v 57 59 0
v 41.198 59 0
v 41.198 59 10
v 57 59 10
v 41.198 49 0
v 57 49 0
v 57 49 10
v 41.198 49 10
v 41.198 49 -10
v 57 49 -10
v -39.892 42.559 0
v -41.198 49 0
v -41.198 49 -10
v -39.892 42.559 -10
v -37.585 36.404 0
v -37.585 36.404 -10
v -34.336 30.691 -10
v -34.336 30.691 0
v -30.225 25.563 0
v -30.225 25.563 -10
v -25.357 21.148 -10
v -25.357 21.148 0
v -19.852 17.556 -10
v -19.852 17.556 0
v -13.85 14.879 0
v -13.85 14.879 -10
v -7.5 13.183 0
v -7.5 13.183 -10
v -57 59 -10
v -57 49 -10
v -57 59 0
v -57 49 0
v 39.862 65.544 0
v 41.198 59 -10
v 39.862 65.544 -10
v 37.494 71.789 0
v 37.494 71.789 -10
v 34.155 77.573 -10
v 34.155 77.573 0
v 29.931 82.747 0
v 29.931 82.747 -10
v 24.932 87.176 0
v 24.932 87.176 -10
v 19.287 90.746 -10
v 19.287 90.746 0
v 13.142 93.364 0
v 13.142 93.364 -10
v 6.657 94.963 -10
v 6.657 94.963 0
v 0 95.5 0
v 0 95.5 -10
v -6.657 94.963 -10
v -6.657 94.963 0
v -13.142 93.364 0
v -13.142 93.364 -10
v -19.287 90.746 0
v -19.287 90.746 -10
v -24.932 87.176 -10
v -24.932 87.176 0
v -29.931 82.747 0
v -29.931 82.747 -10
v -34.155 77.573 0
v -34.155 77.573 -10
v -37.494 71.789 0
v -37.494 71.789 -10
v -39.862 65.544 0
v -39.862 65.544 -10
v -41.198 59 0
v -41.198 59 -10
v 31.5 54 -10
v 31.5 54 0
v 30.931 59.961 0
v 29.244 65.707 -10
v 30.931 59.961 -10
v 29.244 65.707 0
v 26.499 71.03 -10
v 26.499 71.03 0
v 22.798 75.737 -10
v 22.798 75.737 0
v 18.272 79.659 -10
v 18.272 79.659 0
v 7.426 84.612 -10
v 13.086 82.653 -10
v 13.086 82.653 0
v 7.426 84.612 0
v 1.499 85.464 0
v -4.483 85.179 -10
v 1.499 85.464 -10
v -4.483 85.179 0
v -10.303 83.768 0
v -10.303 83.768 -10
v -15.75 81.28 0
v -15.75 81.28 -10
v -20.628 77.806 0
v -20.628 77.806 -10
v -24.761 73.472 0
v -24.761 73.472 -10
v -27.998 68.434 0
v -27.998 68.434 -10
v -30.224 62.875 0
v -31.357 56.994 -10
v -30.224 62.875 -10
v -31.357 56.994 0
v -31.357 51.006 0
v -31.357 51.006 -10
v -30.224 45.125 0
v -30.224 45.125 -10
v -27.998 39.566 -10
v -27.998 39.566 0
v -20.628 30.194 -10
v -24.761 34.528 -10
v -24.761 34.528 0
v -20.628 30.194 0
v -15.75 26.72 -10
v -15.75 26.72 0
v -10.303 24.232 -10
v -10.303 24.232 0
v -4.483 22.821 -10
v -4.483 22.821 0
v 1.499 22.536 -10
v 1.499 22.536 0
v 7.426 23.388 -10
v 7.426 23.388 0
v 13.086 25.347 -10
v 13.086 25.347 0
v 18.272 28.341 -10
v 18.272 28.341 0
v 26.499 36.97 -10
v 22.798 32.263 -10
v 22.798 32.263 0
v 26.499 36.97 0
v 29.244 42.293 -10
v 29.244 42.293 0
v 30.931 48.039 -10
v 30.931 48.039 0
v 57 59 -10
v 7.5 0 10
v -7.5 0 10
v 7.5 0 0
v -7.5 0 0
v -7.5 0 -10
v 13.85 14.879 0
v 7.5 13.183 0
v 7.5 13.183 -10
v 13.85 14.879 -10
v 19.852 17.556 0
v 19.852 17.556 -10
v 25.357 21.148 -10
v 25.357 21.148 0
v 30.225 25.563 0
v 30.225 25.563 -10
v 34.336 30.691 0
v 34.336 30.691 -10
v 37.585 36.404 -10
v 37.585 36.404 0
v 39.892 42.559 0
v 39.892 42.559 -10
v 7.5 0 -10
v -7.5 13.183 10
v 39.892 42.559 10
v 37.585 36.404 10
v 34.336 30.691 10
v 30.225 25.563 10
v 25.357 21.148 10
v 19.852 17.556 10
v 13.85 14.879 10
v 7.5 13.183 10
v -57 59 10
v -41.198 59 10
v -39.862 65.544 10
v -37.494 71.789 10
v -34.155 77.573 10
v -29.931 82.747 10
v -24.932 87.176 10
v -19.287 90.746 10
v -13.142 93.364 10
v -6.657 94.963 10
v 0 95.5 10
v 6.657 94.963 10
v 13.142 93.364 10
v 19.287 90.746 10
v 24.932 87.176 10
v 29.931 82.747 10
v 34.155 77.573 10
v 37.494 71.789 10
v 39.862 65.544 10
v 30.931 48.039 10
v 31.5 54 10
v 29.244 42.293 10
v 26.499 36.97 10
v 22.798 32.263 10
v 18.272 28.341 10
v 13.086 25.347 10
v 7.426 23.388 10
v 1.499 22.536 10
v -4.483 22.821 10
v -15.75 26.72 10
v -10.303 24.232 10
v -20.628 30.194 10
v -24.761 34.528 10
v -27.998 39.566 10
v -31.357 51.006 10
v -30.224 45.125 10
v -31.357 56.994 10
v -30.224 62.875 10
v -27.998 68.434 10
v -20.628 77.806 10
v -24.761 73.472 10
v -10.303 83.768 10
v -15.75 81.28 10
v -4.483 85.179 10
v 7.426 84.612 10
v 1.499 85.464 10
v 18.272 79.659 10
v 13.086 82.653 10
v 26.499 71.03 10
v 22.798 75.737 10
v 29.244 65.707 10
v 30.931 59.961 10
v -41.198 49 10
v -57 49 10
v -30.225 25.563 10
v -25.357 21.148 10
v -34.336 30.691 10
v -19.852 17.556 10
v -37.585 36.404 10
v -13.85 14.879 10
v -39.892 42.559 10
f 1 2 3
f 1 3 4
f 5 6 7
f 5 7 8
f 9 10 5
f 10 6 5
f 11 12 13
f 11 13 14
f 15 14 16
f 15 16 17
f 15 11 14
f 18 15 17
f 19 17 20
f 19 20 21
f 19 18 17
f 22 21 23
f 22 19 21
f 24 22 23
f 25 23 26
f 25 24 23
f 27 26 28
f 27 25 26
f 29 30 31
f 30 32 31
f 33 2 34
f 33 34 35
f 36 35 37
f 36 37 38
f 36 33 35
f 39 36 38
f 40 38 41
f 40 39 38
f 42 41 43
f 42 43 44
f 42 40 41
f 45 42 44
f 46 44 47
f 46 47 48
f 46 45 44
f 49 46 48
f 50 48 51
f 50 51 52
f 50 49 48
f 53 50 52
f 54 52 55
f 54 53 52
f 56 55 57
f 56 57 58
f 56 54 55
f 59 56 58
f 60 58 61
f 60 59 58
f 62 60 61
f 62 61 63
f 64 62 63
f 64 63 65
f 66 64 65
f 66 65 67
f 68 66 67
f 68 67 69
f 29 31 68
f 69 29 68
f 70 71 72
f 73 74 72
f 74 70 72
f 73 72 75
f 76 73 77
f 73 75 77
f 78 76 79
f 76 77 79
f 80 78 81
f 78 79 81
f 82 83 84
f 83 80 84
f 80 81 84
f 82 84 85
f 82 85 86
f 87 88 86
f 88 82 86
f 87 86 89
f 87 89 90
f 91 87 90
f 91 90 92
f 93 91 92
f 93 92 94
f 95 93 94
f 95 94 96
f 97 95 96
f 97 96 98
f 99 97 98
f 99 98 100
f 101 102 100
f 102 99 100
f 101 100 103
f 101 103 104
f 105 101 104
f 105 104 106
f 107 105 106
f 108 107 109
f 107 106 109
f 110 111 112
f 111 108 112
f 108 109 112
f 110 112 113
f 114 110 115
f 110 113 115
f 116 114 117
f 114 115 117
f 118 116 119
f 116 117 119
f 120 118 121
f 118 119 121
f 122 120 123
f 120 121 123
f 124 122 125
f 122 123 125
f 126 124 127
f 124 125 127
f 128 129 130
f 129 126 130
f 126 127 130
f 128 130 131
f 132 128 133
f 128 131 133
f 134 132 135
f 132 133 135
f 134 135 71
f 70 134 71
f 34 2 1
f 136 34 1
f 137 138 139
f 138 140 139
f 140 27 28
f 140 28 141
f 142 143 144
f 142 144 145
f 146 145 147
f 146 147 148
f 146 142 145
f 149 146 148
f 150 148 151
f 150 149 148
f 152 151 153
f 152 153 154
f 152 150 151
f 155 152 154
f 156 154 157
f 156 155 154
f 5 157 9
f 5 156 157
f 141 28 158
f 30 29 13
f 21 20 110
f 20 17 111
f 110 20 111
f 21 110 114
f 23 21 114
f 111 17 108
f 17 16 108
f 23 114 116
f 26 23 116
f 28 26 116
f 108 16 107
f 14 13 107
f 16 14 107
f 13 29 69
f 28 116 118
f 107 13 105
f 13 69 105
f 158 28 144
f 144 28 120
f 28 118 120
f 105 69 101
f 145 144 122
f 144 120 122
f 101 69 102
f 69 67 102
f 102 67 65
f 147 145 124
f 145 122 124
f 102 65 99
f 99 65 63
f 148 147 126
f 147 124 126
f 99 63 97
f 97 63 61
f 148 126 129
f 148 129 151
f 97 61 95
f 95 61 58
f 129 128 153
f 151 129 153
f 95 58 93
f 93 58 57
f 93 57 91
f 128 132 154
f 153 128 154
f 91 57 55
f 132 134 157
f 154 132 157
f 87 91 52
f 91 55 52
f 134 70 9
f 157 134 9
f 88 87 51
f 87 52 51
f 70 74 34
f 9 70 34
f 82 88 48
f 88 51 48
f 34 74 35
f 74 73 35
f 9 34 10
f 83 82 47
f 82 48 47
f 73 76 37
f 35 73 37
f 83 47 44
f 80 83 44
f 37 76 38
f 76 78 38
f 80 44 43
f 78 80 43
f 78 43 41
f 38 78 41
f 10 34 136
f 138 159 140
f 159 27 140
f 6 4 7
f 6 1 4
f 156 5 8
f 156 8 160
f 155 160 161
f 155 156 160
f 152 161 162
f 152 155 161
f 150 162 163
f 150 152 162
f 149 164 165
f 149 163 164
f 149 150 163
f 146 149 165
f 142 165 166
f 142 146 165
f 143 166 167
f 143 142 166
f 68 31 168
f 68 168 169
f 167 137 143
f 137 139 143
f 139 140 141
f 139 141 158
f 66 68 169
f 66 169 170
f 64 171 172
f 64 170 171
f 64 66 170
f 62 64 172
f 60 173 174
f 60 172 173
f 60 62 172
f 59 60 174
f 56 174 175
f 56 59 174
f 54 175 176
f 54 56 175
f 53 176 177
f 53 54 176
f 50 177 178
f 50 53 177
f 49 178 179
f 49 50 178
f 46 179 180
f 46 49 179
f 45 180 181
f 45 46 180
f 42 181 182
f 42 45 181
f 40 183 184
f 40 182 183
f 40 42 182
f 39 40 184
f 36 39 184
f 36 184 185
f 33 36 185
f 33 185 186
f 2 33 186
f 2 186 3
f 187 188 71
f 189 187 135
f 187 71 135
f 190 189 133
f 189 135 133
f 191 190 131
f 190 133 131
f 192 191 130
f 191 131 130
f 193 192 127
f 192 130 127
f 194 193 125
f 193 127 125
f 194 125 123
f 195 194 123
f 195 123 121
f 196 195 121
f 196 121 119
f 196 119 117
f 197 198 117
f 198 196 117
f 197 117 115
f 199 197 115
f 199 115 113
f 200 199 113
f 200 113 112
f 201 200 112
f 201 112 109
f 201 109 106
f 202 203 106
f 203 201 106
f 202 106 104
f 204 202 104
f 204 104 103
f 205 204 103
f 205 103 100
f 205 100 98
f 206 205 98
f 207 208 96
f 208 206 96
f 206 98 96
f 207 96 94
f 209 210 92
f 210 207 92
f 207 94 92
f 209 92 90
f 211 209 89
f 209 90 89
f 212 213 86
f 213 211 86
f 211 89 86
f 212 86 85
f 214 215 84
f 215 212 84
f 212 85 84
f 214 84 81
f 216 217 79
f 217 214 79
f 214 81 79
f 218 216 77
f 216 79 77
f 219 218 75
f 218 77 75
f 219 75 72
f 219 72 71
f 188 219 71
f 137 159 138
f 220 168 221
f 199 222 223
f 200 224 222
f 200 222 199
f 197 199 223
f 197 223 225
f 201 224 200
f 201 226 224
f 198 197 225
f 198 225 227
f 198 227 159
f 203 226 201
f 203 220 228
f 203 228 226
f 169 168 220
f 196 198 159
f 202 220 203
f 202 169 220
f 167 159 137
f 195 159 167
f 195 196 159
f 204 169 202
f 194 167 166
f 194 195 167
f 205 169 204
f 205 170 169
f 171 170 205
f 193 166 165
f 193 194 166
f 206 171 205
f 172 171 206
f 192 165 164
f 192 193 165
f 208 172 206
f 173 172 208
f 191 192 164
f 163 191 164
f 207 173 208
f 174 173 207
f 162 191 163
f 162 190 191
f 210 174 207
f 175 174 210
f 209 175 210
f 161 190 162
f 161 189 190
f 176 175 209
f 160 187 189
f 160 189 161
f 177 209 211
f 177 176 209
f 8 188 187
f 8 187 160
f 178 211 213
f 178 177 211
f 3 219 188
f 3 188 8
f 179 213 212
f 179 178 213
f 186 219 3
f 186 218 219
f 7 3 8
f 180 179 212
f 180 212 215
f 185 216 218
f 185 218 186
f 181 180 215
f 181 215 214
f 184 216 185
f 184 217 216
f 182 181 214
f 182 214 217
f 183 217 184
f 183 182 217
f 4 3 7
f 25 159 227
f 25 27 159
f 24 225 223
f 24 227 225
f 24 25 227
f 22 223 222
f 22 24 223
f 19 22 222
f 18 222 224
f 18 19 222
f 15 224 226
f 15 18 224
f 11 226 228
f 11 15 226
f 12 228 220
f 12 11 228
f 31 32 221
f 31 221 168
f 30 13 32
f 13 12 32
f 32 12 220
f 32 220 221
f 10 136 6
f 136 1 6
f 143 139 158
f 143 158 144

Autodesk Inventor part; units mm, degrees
ref_plane "YZ Plane" through (0, 0, 0) normal (1, 0, 0) x (0, 1, 0)
ref_plane "XZ Plane" through (0, 0, 0) normal (0, 1, 0) x (-1, 0, 0)
ref_plane "XY Plane" through (0, 0, 0) normal (0, 0, 1) x (1, 0, 0)
sketch "Sketch1" plane through (0, 0, 0) normal (0, 0, 1) x (1, 0, 0)
  circle A0 centre (0, 54) radius 31.5
  circle A1 centre (0, 54) radius 41.5
  line L0 (57, 49) -> (-57, 49)
  line L1 (-57, 49) -> (-57, 59)
  line L2 (-57, 59) -> (57, 59)
  line L3 (57, 59) -> (57, 49)
  line L4 (57, 49) -> (-57, 59) construction
  line L5 (-57, 49) -> (57, 59) construction
  line L6 (-7.5, 0) -> (7.5, 0)
  line L7 (7.5, 0) -> (7.5, 22.5)
  line L8 (7.5, 22.5) -> (-7.5, 22.5) construction
  line L9 (-7.5, 22.5) -> (-7.5, 0)
  point P0 (0, 0)
  point P1 (0, 0)
  point P2 (41.1977, 49)
  point P3 (41.1977, 59)
  point P4 (-41.1977, 59)
  point P5 (-41.1977, 49)
  point P6 (-7.5, 13.1833)
  point P7 (7.5, 13.1833)
  dimension "d0" = 54
  dimension "d2" = 10
  dimension "d3" = 63
  dimension "d4" = 10
  dimension "d5" = 114
  dimension "d6" = 15
extrude "Extrusion1" add sketch "Sketch1" along normal mid plane 20 contours A0 L2 A1 L0 | A0 L2 A1 | L0 A1 A0 | A0 L0 A1 L2 | L2 L3 L0 A1 | A1 L0 L1 L2 | L7 L6 L9 A1
equation "\"d4\" = d2"
properties part number "Pipe clamp bracket"
